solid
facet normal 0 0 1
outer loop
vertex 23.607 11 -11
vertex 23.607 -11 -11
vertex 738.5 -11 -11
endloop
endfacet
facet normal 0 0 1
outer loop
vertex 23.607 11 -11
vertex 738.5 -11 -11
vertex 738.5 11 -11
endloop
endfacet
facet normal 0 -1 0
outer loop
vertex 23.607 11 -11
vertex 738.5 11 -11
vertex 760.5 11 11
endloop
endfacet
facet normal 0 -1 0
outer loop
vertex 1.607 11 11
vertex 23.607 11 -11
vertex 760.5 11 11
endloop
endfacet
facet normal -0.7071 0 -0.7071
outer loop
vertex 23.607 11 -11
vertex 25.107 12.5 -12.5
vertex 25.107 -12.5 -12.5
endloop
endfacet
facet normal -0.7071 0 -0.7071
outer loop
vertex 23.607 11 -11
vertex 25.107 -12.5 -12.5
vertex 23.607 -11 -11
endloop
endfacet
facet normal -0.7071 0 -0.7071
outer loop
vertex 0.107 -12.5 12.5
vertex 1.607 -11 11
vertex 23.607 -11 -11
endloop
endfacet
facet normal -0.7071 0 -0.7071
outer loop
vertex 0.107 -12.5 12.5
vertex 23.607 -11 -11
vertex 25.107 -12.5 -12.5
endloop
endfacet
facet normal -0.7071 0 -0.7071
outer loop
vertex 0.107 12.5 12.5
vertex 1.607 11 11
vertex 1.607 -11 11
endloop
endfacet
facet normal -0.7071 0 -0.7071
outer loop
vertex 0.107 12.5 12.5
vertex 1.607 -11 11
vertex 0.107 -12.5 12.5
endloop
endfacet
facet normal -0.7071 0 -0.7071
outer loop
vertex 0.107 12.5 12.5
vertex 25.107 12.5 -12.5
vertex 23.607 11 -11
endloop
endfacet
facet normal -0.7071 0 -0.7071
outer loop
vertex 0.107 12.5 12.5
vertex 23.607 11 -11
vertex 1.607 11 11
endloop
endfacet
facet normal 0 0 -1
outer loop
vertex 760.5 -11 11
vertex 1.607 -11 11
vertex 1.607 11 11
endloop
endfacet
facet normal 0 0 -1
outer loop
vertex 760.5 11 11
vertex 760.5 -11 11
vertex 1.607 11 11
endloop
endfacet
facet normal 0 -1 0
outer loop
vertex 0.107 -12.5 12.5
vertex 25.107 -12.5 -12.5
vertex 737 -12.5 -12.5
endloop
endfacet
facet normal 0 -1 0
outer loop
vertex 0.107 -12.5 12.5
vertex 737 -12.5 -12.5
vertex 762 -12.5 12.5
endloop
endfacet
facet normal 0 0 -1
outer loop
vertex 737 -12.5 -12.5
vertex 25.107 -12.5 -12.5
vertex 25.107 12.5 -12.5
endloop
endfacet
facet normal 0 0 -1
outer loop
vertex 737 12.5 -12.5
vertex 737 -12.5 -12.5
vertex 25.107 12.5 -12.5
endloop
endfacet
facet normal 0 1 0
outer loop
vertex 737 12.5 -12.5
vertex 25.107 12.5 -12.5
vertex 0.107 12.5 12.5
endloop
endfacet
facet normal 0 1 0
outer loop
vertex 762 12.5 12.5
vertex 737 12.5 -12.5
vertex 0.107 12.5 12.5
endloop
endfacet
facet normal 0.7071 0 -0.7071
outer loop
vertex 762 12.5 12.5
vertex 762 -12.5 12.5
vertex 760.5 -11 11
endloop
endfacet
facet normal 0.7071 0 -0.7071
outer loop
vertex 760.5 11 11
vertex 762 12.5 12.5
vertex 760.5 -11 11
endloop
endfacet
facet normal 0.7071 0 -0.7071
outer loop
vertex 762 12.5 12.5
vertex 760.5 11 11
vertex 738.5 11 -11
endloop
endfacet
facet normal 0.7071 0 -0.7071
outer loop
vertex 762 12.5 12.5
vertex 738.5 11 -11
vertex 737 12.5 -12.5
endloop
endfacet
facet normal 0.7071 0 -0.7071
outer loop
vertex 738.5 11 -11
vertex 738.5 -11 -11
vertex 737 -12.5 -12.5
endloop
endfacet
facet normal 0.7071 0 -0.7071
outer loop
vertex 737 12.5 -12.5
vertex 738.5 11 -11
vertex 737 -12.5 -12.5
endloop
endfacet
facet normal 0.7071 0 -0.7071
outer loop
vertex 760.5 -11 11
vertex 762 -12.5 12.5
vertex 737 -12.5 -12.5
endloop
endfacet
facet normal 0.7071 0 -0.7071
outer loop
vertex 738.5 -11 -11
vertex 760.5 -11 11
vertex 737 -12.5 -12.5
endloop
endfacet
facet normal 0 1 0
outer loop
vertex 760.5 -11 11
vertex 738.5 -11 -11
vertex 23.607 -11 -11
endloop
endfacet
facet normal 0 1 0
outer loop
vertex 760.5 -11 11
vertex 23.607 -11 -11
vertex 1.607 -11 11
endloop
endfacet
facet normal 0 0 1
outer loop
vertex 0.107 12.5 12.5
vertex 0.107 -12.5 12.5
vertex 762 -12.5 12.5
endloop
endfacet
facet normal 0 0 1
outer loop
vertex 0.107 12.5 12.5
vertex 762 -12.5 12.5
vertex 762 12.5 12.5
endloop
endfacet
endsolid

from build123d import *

# Parameters (mm, degrees)
F0_W     = 25
F0_H     = 25
F1_DEPTH = 762
F3_DEPTH = 12.5
F4_W     = 22
F4_H     = 22
F5_DEPTH = 762.001


with BuildPart() as f1:
    # F0 (on Right) → F1 (new body)
    with BuildSketch(Plane.YZ):
        Rectangle(F0_W, F0_H)
    extrude(amount=F1_DEPTH)

    # F2 (on Front) → F3 (cut, symmetric)
    with BuildSketch(Plane.XZ):
        Polygon((35.352029, -22.745401), (0, 12.606628), (0, -26.686775), align=None)
        Polygon((762, -22.745401), (762, 12.5), (732.63703, -16.86297), align=None)
    extrude(amount=F3_DEPTH, both=True, mode=Mode.SUBTRACT)

    # F4 (on Right) → F5 (cut, through all)
    with BuildSketch(Plane.YZ):
        Rectangle(F4_W, F4_H)
    extrude(amount=F5_DEPTH, mode=Mode.SUBTRACT)


solid = f1.part
